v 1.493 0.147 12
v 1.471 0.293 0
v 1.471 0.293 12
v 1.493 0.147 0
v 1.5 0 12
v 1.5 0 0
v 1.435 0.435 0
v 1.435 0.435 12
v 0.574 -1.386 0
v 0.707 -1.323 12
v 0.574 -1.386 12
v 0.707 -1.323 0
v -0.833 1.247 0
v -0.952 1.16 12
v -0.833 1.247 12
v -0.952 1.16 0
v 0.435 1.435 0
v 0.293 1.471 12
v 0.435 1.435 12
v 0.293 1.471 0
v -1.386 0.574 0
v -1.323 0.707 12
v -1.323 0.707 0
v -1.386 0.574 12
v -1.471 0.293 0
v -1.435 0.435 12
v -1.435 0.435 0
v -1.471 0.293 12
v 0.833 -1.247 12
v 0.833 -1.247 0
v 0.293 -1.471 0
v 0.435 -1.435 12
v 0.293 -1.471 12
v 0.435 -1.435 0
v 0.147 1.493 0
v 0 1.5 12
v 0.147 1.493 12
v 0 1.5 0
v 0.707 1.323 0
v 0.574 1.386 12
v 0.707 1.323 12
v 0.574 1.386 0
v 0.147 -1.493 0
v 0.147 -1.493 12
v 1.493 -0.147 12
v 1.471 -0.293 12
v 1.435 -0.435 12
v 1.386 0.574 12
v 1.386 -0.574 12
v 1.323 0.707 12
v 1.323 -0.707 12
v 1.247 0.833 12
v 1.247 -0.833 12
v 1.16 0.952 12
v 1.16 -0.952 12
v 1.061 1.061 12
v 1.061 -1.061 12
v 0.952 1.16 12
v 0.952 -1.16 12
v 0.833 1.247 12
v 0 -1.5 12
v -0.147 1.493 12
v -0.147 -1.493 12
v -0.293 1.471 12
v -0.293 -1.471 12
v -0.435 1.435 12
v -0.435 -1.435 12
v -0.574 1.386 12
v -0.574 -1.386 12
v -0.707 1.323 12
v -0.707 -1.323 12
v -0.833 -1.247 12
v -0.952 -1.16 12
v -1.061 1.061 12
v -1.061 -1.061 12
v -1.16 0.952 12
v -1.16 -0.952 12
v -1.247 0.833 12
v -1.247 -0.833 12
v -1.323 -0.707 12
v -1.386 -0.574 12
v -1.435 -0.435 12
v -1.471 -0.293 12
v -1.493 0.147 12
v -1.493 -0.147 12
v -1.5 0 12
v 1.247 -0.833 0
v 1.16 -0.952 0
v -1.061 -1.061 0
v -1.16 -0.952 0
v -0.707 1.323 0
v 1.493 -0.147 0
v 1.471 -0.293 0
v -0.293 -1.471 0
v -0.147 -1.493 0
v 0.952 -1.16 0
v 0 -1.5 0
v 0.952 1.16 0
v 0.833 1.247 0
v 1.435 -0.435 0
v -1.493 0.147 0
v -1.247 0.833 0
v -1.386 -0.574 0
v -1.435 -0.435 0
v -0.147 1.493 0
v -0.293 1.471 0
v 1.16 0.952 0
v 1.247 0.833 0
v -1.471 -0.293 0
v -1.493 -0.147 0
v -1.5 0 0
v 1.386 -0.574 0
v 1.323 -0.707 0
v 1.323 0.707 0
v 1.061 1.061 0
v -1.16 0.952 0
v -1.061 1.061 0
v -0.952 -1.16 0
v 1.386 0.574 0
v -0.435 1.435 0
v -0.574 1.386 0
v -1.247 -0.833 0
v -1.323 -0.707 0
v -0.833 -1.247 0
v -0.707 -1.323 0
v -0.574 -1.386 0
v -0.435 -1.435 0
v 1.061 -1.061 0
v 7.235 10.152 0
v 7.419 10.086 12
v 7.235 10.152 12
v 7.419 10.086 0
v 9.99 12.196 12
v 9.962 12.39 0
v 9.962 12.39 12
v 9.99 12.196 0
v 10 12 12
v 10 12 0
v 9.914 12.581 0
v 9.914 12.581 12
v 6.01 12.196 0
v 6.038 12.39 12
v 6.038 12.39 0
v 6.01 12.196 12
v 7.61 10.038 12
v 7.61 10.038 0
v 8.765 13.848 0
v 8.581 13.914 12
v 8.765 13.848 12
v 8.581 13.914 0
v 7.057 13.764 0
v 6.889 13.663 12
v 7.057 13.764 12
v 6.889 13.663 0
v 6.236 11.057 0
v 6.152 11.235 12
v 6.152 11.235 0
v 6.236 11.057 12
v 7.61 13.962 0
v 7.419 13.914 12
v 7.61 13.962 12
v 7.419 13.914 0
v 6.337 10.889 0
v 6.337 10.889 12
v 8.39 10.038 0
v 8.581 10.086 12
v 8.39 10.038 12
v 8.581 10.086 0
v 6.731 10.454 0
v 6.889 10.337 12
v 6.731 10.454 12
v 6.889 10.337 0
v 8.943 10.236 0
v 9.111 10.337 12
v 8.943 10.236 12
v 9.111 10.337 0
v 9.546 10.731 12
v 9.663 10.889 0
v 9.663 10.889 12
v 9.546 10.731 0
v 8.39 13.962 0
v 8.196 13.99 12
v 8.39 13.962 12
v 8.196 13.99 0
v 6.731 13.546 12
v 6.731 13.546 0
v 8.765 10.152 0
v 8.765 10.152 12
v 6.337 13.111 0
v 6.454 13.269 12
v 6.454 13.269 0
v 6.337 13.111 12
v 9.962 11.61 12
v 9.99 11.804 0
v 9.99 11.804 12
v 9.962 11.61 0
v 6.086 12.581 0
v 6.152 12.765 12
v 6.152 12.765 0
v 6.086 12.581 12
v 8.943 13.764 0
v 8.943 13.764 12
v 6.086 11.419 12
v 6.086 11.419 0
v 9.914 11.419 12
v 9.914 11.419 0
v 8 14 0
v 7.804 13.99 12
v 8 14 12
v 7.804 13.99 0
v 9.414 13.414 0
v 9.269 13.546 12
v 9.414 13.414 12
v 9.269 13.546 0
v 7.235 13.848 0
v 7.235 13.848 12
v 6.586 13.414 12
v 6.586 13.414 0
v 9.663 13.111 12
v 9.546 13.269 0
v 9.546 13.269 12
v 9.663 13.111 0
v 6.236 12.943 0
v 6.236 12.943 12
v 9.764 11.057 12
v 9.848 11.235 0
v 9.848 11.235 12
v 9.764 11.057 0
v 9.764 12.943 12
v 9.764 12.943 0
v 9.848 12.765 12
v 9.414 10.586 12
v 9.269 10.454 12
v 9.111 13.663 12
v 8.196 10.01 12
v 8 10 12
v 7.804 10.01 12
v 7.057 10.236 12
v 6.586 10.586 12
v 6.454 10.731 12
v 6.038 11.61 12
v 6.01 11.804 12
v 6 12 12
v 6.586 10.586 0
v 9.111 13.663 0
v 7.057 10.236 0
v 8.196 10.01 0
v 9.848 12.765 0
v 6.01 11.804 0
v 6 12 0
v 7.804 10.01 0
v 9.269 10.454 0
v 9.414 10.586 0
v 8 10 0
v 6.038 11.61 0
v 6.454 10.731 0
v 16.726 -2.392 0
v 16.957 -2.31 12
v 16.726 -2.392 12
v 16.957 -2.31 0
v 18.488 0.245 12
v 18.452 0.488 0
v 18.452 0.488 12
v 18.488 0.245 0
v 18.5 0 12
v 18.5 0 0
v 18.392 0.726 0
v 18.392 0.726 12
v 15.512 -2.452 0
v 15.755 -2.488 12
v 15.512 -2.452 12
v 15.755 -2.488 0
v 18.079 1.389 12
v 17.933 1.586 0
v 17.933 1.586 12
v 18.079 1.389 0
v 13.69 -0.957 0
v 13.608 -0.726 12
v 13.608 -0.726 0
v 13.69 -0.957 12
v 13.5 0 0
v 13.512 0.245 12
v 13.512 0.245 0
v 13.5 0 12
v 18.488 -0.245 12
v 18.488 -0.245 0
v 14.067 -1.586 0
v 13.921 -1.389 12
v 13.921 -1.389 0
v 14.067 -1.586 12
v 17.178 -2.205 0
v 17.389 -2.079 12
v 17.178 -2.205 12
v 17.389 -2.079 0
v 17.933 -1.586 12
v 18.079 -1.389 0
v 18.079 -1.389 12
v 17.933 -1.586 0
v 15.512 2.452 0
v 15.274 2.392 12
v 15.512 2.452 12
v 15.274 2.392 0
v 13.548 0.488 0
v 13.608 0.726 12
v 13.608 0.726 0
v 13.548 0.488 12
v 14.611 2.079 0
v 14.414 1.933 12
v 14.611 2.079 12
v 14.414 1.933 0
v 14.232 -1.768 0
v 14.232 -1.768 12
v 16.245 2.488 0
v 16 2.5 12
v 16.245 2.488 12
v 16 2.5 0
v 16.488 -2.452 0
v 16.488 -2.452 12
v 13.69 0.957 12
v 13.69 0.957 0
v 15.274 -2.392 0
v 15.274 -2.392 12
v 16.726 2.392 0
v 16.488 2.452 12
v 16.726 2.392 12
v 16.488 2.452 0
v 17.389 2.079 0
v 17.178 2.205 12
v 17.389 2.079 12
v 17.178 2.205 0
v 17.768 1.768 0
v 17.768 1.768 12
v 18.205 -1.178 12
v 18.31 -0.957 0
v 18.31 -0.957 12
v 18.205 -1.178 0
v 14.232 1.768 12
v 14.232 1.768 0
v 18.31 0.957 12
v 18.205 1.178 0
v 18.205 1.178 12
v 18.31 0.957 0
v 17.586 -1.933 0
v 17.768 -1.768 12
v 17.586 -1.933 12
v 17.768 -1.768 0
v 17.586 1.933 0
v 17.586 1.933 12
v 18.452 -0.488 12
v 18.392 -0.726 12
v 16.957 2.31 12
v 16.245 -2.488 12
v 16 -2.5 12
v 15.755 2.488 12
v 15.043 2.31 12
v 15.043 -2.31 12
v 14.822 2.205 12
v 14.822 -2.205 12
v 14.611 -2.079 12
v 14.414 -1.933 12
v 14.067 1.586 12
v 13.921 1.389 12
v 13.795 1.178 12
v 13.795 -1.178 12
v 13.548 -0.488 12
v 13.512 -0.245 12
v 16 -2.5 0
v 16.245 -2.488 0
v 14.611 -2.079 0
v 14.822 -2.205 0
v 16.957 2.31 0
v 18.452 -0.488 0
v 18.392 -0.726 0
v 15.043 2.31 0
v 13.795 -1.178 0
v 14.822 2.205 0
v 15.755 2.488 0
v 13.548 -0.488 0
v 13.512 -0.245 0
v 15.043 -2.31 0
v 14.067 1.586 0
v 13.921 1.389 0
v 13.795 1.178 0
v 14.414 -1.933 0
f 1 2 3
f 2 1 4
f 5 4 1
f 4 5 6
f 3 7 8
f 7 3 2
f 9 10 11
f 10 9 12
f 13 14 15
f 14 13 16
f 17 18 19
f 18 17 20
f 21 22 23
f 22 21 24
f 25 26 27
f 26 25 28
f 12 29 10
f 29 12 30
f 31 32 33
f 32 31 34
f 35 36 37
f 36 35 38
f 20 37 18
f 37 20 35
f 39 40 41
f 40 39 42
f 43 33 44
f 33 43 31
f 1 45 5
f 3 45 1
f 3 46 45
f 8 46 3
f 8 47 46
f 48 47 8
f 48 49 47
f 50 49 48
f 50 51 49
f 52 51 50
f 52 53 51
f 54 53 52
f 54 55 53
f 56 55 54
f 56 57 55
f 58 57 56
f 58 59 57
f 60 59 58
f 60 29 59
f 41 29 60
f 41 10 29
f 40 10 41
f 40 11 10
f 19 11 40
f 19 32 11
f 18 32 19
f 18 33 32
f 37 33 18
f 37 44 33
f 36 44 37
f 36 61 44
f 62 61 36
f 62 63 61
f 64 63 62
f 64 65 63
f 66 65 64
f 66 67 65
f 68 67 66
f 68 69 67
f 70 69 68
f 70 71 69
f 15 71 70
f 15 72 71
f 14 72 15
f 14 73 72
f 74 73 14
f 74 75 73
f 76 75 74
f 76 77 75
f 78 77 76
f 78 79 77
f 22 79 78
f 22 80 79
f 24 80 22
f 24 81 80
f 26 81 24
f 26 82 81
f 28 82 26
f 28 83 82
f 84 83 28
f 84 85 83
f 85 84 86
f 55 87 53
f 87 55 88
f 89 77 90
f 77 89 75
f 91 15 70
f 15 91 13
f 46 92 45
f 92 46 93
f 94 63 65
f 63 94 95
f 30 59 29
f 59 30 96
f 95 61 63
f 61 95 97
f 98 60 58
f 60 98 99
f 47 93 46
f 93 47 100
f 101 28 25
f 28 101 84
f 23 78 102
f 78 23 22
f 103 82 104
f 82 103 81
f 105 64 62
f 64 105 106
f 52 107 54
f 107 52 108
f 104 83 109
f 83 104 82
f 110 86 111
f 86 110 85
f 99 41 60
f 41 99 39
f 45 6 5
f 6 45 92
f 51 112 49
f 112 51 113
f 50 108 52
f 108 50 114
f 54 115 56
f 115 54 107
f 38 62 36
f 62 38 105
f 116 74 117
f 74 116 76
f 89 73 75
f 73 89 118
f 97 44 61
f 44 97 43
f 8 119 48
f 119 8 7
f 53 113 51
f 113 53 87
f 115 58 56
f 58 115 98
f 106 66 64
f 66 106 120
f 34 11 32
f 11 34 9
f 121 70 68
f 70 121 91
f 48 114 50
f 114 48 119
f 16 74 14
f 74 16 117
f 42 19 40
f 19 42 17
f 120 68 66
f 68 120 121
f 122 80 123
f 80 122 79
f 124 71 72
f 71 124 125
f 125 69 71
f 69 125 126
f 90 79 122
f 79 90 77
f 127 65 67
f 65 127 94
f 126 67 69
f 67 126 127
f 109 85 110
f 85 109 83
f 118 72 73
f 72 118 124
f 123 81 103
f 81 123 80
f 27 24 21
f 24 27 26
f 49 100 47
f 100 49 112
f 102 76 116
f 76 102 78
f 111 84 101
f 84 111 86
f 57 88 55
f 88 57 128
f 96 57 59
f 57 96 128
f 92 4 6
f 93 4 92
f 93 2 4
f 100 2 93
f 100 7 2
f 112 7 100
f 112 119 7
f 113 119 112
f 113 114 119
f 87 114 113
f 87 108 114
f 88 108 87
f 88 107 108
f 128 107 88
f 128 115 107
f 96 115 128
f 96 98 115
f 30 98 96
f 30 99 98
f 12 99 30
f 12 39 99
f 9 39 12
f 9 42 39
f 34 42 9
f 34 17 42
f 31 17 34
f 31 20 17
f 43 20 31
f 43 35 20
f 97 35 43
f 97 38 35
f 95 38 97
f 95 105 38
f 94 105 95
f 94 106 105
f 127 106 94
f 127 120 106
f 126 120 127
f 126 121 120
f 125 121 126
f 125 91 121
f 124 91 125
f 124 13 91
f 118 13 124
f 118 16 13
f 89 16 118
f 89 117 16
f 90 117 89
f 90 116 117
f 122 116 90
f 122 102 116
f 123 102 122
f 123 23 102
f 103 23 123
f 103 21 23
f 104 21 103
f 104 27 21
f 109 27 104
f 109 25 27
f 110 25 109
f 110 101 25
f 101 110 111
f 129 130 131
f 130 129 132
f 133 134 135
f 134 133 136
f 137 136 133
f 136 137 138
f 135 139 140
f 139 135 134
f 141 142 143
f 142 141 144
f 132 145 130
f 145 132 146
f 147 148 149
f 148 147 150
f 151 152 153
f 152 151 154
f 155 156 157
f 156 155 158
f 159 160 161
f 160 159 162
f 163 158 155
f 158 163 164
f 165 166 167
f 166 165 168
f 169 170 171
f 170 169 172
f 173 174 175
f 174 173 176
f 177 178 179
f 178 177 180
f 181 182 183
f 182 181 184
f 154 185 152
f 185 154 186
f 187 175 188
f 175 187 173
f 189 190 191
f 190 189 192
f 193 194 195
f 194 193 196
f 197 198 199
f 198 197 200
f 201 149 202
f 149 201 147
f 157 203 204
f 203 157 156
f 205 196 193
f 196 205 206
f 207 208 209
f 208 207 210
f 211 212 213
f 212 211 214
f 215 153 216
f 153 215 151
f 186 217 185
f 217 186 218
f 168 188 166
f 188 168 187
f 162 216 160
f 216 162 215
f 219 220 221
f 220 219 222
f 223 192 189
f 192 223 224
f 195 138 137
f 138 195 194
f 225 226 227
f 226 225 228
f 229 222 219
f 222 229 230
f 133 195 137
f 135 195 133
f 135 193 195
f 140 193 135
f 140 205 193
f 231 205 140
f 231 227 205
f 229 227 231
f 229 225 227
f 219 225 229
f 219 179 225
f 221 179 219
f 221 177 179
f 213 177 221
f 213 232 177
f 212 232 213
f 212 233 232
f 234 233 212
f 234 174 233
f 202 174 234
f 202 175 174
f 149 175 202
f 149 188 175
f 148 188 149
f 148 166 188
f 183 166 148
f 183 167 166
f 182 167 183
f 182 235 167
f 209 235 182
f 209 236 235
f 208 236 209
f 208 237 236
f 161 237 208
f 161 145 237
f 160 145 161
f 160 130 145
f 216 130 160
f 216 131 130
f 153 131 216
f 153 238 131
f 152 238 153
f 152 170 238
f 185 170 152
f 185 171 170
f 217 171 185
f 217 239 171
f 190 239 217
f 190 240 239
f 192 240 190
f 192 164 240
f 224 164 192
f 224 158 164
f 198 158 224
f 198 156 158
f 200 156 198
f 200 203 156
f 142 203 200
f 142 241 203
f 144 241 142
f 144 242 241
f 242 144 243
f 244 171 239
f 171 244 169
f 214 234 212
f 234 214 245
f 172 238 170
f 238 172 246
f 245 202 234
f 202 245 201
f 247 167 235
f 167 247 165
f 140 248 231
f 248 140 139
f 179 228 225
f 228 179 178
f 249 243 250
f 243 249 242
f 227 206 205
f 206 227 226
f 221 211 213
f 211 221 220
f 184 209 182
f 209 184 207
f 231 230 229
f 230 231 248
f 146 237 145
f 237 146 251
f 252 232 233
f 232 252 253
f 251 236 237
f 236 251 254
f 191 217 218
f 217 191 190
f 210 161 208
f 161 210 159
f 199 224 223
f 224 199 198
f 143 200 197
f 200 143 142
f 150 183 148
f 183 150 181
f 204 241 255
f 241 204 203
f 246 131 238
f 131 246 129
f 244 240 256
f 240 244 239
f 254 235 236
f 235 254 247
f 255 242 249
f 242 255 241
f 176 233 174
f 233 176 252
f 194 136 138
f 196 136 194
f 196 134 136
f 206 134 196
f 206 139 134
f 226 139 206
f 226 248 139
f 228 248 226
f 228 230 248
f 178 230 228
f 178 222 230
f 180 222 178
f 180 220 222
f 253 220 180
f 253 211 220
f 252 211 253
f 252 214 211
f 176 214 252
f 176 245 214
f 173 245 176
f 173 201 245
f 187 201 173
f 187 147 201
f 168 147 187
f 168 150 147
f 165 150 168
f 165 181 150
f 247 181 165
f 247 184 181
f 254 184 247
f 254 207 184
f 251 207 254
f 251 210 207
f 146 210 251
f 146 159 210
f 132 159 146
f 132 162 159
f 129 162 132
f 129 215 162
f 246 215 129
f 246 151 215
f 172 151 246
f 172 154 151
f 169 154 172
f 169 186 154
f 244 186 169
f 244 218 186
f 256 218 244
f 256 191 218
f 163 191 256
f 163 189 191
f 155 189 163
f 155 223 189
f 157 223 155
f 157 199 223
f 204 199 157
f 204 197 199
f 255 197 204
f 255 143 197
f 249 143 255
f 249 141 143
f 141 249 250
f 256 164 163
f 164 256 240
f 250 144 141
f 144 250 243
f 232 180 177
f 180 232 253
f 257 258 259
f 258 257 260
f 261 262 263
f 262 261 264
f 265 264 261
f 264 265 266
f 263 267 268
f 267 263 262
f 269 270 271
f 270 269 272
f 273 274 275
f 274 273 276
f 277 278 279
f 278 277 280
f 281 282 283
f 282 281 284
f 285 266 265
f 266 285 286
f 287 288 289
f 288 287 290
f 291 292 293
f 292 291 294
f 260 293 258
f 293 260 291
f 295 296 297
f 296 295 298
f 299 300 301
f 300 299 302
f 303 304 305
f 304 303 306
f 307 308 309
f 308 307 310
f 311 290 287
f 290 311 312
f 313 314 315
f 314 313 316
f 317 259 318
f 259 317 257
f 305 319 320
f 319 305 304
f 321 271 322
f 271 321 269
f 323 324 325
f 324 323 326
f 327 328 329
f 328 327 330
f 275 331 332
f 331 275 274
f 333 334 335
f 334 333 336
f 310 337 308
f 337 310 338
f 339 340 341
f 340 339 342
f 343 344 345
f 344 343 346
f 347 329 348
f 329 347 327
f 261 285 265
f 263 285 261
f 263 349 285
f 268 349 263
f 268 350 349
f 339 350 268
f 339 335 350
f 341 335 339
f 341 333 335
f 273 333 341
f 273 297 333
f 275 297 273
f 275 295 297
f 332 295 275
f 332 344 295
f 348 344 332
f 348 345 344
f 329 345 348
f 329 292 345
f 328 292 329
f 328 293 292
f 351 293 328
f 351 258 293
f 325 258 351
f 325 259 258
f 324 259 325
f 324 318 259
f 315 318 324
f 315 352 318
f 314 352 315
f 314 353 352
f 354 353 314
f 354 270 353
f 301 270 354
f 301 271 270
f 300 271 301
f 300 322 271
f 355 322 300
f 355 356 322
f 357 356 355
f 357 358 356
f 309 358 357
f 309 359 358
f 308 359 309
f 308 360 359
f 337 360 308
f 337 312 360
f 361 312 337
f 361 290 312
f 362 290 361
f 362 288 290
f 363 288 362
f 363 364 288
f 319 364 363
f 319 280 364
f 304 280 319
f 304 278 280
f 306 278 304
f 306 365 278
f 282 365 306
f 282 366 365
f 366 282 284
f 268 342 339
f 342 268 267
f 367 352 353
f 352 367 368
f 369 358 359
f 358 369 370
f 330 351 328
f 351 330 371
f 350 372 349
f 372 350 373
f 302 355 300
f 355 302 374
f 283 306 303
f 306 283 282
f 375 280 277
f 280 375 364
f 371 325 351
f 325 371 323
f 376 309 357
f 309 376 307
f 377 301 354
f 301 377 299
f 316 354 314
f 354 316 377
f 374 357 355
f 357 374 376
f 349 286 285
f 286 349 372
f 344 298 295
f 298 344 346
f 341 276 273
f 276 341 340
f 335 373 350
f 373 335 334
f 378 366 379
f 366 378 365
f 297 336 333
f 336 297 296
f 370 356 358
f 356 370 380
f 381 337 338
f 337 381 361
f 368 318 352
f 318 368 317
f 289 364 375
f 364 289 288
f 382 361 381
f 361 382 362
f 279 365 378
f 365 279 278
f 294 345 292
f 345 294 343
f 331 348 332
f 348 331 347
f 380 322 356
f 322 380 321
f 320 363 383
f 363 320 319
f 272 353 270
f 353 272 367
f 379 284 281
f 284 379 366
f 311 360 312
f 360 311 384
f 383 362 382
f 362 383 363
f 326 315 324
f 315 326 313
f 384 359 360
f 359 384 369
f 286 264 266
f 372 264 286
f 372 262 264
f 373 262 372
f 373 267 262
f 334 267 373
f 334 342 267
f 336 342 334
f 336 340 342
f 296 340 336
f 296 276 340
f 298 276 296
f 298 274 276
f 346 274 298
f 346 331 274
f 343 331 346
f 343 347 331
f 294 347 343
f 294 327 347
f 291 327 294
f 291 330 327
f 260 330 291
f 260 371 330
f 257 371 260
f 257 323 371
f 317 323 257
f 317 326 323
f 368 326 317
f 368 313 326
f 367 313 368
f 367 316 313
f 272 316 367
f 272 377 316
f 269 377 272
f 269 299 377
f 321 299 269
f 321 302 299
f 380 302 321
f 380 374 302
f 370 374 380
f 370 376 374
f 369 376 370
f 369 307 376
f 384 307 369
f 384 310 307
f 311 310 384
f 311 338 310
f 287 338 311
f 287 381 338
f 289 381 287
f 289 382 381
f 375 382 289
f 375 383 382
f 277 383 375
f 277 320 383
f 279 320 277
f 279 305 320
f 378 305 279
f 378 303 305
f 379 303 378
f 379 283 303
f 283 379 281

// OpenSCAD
$fn = 64;

cylinder(h = 12, d = 3);

translate([8, 12, 0])
cylinder(h = 12, d = 4);

translate([16, 0, 0])
  cylinder(h = 12, d = 5);
